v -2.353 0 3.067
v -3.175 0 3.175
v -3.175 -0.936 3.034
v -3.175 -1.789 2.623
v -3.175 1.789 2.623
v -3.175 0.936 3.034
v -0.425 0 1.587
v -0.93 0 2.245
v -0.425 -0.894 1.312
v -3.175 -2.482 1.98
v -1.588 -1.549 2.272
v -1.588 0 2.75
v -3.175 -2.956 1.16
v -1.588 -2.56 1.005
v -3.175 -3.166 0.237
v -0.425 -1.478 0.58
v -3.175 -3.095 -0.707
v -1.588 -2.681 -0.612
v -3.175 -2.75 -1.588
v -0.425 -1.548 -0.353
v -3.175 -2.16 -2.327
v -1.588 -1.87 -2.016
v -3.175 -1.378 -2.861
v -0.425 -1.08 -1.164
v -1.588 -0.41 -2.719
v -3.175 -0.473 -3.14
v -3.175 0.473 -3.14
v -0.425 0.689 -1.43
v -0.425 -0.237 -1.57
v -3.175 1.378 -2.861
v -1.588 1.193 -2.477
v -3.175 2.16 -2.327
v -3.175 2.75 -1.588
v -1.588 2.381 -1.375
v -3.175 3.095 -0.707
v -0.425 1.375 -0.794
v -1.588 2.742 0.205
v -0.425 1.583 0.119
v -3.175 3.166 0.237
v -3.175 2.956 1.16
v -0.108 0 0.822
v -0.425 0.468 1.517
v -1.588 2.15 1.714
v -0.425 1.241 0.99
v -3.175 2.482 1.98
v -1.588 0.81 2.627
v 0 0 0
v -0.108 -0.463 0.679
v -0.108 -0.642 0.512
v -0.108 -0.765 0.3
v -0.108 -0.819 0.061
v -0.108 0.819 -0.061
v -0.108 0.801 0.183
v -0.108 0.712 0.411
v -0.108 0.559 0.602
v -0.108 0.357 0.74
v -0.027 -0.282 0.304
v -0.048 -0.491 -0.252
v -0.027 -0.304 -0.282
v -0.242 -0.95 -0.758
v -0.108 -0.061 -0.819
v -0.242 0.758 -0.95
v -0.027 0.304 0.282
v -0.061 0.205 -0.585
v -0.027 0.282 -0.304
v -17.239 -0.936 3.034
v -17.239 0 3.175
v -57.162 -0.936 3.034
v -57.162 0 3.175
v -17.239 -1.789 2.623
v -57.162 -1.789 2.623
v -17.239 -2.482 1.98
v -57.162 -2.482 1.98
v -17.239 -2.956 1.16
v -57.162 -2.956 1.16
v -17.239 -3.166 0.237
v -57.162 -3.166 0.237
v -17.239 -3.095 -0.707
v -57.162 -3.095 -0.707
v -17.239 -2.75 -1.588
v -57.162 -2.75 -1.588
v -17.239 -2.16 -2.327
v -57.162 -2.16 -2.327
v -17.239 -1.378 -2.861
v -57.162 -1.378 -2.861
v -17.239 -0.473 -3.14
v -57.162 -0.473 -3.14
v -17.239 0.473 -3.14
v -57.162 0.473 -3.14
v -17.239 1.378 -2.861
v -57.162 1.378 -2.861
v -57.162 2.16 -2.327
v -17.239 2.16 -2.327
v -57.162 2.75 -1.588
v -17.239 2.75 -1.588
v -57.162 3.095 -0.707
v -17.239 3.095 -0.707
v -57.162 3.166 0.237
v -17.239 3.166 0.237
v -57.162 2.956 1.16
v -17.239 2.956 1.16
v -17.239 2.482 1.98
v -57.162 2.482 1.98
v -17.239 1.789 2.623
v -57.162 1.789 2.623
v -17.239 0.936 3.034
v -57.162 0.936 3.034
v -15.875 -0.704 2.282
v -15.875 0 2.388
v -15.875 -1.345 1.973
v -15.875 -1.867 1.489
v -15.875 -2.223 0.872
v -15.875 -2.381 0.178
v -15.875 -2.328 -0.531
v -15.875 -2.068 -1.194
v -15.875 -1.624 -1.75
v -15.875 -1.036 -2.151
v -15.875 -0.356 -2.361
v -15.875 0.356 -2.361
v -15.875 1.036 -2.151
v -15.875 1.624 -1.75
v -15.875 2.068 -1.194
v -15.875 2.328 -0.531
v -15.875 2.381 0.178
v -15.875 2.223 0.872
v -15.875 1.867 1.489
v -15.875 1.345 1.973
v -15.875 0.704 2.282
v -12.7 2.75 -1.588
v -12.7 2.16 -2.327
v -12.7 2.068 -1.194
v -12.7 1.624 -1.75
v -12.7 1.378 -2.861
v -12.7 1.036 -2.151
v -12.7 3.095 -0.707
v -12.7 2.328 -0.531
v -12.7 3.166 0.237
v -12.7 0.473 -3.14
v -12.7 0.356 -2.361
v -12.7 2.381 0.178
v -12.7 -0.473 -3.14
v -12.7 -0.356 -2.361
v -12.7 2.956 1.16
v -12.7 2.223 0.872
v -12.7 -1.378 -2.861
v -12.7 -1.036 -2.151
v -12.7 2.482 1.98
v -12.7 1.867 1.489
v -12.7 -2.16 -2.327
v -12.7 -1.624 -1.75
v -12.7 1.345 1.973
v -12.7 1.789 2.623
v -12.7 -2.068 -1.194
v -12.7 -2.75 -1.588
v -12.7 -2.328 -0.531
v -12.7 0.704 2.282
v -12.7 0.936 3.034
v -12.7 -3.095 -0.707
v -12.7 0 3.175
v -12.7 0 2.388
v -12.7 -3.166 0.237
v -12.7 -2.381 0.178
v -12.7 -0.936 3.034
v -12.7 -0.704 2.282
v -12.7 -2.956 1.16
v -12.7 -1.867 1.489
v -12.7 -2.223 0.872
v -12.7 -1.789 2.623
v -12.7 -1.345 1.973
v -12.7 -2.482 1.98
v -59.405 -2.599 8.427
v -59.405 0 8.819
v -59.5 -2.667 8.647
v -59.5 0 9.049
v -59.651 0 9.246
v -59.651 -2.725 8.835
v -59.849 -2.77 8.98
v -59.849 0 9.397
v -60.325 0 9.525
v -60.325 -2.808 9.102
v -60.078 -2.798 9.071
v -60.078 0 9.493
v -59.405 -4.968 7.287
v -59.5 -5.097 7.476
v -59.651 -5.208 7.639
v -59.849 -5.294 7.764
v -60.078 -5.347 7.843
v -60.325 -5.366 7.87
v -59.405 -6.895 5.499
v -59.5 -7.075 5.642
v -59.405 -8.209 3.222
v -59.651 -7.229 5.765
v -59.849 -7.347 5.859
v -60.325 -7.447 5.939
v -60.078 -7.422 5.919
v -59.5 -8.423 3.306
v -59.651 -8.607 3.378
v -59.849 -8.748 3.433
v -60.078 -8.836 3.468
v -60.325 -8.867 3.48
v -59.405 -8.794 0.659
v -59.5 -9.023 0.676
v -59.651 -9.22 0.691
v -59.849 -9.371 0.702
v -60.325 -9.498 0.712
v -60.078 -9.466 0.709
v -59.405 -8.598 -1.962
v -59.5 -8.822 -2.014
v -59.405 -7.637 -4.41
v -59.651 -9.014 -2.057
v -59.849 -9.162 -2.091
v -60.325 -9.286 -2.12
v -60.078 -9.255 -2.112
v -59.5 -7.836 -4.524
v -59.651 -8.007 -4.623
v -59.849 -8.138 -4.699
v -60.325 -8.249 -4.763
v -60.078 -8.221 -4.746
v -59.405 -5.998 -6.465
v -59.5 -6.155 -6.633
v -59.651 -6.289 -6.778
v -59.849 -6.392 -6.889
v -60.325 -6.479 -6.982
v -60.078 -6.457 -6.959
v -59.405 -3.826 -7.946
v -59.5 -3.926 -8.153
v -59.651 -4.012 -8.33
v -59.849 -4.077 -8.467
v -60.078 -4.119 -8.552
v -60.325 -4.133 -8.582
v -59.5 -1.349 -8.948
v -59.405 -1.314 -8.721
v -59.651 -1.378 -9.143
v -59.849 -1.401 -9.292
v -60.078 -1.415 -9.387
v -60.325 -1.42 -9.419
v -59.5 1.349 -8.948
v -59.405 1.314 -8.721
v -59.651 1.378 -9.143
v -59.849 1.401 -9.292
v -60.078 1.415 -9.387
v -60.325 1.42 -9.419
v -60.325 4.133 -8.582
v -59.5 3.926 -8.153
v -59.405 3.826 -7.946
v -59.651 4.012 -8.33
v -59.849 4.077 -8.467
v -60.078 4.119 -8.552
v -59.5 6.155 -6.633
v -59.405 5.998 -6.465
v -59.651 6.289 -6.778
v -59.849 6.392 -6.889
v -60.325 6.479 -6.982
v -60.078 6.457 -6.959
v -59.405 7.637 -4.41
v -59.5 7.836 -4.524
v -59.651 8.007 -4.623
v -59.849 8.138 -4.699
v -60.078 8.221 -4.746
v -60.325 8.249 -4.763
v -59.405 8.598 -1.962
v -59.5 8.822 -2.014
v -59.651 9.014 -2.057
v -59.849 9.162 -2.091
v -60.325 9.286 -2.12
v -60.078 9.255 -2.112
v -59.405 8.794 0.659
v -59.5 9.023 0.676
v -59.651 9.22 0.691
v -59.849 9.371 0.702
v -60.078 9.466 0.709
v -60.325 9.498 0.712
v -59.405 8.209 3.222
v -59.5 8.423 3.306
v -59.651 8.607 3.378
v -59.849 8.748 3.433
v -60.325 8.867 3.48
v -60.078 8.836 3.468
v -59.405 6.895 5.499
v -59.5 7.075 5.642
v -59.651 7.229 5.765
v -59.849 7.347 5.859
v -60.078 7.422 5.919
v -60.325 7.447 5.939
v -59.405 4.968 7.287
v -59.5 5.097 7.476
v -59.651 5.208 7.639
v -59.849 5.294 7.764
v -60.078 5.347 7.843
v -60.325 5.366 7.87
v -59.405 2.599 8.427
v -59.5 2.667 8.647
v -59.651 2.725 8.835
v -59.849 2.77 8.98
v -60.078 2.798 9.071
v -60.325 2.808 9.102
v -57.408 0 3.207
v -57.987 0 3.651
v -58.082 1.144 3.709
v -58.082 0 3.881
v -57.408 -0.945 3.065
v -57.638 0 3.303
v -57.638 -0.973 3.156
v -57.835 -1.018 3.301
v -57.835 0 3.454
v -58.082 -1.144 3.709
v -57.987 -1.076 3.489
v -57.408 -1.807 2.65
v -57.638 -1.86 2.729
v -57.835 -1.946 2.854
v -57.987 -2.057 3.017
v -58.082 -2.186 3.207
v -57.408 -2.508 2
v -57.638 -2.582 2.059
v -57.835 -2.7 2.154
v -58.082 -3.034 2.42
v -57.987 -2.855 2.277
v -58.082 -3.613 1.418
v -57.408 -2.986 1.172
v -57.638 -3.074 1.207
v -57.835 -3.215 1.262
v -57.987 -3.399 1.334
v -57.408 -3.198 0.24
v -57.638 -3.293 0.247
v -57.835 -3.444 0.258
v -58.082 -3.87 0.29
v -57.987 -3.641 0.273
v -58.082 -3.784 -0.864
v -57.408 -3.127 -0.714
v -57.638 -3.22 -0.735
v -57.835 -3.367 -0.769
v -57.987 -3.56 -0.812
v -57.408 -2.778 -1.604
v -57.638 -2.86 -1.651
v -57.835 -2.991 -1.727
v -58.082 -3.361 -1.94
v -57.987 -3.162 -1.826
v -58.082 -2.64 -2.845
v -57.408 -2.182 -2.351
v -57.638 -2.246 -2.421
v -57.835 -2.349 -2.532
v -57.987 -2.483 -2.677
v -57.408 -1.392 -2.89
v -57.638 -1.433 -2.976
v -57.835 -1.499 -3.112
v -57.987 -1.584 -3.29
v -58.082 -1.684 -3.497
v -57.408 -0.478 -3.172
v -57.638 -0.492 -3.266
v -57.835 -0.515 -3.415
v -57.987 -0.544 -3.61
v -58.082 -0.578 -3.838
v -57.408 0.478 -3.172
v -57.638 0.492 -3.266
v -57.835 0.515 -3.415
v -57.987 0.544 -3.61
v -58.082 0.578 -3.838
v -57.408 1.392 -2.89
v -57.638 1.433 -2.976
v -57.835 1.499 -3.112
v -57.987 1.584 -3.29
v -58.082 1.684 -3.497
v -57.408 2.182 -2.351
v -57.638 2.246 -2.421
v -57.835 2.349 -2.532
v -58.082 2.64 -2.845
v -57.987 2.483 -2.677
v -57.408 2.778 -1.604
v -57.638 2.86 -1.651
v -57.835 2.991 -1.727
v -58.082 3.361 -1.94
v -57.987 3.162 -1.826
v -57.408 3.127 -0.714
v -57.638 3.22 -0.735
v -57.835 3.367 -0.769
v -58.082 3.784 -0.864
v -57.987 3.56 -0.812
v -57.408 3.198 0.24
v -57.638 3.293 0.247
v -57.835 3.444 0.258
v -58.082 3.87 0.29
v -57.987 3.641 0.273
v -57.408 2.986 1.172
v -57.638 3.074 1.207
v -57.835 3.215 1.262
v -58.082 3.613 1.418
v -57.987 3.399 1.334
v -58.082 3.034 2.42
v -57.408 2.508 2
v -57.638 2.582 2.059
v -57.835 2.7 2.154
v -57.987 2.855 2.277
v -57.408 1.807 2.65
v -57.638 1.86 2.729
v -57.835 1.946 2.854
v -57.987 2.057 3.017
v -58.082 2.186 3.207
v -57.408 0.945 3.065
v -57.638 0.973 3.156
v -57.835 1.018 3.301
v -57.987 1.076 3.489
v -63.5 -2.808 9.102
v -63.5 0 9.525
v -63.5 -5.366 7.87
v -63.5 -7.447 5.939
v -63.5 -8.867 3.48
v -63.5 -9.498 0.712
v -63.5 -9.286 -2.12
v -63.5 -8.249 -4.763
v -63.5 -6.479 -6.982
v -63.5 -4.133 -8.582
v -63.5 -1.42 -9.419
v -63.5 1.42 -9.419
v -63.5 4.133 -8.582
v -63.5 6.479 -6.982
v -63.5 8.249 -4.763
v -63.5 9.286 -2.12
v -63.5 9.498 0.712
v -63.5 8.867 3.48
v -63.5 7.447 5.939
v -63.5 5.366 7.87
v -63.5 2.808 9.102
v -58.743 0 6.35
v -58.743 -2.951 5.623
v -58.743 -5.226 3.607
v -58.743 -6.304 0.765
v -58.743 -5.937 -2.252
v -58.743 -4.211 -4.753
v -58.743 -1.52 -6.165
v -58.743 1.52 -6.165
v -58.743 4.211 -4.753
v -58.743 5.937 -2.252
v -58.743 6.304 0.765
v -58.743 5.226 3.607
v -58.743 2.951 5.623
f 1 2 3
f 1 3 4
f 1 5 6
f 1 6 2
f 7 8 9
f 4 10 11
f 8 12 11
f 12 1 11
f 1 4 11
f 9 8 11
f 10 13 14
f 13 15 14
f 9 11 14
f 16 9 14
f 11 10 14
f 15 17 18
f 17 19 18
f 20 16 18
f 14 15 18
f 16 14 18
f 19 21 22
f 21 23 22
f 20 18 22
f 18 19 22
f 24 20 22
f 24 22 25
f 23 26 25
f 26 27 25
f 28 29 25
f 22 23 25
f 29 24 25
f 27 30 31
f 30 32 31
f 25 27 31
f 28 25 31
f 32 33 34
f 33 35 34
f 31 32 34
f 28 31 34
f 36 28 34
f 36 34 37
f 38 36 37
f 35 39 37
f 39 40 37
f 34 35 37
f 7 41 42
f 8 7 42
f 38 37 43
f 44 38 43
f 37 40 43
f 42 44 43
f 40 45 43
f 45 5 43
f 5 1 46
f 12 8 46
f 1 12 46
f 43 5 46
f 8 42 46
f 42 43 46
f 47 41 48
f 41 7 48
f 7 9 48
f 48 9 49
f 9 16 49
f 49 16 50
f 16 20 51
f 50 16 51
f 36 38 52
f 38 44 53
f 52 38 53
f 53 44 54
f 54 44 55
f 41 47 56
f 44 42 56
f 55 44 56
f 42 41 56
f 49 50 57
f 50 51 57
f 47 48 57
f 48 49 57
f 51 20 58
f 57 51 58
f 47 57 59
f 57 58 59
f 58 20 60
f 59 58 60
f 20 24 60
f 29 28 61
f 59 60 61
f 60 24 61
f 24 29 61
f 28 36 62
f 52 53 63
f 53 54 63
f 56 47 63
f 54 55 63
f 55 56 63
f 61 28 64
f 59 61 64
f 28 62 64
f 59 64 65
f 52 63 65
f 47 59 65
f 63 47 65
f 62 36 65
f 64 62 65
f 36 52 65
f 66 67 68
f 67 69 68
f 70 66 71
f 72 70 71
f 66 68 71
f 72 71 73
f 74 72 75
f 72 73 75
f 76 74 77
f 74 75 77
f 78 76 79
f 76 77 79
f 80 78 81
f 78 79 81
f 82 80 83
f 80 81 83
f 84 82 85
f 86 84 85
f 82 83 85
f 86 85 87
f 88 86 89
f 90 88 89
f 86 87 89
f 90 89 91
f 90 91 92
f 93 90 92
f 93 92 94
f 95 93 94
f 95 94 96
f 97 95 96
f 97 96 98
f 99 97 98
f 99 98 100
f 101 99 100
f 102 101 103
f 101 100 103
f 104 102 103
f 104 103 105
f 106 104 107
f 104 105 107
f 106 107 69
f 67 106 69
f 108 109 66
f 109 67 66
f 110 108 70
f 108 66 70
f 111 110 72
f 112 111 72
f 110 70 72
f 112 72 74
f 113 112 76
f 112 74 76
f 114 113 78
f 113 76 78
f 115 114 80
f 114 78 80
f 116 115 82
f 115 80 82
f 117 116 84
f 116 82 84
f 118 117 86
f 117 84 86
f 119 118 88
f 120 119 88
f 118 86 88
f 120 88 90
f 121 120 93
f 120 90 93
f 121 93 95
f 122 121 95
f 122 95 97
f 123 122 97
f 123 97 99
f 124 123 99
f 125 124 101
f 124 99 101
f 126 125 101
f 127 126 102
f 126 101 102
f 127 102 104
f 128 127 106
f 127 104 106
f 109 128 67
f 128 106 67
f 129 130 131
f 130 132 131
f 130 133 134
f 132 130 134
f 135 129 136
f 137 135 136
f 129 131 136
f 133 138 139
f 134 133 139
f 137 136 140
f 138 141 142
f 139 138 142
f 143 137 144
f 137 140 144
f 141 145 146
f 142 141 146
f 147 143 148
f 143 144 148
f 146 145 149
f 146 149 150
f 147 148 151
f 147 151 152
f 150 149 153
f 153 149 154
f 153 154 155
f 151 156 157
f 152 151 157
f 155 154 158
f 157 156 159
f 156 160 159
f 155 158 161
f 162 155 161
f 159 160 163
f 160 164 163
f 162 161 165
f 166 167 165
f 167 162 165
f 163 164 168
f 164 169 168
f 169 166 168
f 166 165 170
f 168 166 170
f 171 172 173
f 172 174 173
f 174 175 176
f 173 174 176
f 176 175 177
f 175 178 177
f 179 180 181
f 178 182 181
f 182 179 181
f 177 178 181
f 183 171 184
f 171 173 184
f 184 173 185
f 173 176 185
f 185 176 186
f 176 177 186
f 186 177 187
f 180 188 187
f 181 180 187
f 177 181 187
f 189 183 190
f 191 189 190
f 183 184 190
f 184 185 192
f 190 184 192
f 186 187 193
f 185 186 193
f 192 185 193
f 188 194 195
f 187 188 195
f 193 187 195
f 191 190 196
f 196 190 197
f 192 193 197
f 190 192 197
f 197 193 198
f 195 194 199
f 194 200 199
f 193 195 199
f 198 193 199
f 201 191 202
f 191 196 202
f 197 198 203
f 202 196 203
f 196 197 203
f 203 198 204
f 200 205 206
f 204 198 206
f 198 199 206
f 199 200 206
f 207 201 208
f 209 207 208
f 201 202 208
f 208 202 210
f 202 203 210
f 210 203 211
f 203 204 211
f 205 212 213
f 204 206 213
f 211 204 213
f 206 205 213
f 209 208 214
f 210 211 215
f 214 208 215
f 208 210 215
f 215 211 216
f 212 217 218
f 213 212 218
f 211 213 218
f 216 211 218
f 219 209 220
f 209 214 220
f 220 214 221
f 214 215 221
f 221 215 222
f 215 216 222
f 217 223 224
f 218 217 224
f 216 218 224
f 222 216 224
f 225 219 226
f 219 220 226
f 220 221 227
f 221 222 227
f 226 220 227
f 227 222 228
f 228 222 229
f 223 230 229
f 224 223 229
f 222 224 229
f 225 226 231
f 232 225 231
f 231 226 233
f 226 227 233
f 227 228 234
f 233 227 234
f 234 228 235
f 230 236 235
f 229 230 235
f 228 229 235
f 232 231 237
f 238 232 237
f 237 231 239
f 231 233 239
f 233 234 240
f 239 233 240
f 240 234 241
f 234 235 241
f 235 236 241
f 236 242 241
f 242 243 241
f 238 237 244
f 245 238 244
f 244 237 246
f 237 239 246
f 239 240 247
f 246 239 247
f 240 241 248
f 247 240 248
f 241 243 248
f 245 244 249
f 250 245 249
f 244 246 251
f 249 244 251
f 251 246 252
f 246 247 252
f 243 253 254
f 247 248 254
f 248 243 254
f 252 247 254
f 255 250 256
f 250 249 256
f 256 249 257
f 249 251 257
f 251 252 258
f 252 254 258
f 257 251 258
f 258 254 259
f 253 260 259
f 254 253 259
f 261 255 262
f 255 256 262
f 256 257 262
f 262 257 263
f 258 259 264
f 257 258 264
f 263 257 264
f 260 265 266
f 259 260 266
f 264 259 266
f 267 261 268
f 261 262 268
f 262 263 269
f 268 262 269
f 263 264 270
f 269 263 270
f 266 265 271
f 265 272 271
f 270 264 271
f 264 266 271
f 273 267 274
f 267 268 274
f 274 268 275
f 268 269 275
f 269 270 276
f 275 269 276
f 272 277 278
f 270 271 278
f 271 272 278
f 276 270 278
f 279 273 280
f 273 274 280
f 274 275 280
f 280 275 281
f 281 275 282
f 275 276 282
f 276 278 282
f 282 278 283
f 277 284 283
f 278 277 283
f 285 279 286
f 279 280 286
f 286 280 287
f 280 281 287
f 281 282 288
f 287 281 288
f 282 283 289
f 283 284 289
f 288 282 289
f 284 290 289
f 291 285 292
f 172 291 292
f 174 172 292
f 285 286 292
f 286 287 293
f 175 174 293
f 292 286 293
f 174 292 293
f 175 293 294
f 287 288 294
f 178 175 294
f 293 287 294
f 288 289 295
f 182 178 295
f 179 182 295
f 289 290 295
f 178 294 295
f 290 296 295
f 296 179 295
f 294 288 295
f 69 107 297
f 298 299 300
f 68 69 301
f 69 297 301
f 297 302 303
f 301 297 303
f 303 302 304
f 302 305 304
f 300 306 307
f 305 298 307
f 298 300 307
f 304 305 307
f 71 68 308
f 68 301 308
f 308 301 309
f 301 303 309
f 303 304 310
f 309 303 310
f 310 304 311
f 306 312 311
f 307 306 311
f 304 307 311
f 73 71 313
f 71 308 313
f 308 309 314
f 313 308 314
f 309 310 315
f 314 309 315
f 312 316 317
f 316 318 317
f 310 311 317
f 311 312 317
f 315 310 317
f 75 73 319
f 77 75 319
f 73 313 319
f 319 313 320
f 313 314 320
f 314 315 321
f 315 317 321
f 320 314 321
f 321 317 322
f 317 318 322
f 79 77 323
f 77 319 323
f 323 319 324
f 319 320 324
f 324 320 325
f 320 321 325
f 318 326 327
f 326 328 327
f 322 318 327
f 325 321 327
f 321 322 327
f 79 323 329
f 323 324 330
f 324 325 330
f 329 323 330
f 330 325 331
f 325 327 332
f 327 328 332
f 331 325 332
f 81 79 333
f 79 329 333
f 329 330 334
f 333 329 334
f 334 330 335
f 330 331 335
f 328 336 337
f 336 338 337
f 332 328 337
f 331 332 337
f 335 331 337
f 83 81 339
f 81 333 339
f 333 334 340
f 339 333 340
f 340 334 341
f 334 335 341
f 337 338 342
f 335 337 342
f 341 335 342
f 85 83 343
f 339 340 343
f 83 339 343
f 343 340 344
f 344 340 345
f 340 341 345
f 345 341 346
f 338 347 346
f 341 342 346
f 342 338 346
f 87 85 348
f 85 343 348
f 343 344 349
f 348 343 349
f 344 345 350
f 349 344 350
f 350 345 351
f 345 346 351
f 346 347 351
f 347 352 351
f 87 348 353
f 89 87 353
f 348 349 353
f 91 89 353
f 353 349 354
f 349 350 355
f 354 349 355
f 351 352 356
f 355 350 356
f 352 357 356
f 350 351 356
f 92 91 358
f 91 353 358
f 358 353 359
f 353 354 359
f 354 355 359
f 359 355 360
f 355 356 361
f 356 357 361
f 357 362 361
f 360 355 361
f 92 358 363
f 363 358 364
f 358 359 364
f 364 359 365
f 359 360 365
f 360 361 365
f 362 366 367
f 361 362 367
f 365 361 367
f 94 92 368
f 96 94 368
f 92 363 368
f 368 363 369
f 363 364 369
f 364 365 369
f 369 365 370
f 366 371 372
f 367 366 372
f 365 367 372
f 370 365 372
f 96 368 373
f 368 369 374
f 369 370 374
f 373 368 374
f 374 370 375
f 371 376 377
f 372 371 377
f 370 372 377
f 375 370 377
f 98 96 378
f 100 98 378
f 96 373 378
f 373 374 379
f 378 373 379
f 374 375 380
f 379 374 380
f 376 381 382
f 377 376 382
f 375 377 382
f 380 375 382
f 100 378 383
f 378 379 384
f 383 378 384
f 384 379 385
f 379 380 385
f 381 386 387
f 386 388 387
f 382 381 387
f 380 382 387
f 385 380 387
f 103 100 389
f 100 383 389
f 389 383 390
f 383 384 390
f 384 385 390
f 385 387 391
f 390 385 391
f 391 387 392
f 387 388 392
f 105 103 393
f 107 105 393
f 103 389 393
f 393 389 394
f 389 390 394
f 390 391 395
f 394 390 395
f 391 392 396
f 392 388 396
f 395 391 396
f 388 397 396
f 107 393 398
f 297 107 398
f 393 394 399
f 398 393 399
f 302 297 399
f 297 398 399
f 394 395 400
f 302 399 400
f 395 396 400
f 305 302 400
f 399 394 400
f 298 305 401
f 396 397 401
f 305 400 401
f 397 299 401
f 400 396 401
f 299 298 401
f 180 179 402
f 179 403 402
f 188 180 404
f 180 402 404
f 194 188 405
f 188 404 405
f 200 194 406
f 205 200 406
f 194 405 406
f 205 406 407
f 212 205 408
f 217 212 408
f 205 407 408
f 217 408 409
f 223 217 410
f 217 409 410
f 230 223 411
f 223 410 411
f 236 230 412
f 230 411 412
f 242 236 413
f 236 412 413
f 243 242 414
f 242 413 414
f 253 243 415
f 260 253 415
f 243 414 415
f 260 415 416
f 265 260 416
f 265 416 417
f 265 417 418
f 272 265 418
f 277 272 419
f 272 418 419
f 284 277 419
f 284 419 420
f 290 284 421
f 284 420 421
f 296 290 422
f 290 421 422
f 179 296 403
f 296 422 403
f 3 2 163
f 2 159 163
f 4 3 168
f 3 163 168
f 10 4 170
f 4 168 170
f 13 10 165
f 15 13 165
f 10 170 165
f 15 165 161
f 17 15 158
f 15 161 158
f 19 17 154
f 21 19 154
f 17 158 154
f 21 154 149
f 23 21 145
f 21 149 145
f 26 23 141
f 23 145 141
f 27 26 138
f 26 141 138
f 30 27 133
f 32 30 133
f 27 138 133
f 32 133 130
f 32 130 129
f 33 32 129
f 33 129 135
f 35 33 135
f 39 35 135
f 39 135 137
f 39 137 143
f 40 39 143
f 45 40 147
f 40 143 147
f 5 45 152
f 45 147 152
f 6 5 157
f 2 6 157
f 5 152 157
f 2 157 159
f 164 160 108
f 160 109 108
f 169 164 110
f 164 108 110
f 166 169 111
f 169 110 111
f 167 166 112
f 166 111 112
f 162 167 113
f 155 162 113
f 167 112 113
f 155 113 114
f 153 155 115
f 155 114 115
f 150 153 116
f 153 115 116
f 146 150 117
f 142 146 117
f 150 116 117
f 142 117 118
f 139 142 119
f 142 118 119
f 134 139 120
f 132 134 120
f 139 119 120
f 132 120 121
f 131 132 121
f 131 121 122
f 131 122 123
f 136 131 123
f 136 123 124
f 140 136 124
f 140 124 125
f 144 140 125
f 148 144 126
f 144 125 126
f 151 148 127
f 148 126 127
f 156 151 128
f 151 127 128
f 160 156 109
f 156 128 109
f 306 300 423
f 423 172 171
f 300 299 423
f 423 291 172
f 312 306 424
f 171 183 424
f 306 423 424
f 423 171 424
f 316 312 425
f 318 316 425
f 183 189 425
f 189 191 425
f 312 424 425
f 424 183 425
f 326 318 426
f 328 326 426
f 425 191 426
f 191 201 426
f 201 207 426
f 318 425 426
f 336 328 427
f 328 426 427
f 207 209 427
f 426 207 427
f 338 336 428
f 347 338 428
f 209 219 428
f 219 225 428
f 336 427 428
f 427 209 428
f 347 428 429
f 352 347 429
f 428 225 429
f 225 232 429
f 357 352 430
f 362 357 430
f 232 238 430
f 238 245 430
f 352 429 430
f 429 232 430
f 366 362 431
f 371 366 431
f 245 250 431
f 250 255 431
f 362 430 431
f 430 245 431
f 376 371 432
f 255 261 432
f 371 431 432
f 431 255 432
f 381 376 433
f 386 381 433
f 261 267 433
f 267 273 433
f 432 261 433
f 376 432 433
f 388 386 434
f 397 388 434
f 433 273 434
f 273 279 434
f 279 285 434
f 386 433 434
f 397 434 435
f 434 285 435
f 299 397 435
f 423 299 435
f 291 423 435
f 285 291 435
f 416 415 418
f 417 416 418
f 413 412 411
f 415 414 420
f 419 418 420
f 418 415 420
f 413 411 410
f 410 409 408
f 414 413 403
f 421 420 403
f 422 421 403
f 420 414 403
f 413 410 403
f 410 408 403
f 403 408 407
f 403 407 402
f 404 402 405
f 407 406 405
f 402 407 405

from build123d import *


with BuildPart() as f1:
    # F0 (on Front) → F1 (revolve)
    with BuildSketch(Plane.XZ):
        with BuildLine():
            Line((-63.5, 9.525), (-63.5, 0))
            Line((-63.5, 0), (0, 0))
            ThreePointArc((0, 0), (-0.929936, 2.245064), (-3.175, 3.175))
            Line((-3.175, 3.175), (-12.7, 3.175))
            Line((-12.7, 3.175), (-12.7, 2.3876))
            Line((-12.7, 2.3876), (-15.875, 2.3876))
            Line((-15.875, 2.3876), (-17.238817, 3.175))
            Line((-17.238817, 3.175), (-57.161765, 3.175))
            ThreePointArc((-57.161765, 3.175), (-57.74161, 3.371831), (-58.081809, 3.880975))
            Line((-58.081809, 3.880975), (-59.404956, 8.819025))
            ThreePointArc((-59.404956, 8.819025), (-59.745155, 9.328169), (-60.325, 9.525))
            Line((-60.325, 9.525), (-63.5, 9.525))
        make_face()
    revolve(axis=Axis((-38.125068, 0, 0), (1, 0, 0)))


solid = f1.part
